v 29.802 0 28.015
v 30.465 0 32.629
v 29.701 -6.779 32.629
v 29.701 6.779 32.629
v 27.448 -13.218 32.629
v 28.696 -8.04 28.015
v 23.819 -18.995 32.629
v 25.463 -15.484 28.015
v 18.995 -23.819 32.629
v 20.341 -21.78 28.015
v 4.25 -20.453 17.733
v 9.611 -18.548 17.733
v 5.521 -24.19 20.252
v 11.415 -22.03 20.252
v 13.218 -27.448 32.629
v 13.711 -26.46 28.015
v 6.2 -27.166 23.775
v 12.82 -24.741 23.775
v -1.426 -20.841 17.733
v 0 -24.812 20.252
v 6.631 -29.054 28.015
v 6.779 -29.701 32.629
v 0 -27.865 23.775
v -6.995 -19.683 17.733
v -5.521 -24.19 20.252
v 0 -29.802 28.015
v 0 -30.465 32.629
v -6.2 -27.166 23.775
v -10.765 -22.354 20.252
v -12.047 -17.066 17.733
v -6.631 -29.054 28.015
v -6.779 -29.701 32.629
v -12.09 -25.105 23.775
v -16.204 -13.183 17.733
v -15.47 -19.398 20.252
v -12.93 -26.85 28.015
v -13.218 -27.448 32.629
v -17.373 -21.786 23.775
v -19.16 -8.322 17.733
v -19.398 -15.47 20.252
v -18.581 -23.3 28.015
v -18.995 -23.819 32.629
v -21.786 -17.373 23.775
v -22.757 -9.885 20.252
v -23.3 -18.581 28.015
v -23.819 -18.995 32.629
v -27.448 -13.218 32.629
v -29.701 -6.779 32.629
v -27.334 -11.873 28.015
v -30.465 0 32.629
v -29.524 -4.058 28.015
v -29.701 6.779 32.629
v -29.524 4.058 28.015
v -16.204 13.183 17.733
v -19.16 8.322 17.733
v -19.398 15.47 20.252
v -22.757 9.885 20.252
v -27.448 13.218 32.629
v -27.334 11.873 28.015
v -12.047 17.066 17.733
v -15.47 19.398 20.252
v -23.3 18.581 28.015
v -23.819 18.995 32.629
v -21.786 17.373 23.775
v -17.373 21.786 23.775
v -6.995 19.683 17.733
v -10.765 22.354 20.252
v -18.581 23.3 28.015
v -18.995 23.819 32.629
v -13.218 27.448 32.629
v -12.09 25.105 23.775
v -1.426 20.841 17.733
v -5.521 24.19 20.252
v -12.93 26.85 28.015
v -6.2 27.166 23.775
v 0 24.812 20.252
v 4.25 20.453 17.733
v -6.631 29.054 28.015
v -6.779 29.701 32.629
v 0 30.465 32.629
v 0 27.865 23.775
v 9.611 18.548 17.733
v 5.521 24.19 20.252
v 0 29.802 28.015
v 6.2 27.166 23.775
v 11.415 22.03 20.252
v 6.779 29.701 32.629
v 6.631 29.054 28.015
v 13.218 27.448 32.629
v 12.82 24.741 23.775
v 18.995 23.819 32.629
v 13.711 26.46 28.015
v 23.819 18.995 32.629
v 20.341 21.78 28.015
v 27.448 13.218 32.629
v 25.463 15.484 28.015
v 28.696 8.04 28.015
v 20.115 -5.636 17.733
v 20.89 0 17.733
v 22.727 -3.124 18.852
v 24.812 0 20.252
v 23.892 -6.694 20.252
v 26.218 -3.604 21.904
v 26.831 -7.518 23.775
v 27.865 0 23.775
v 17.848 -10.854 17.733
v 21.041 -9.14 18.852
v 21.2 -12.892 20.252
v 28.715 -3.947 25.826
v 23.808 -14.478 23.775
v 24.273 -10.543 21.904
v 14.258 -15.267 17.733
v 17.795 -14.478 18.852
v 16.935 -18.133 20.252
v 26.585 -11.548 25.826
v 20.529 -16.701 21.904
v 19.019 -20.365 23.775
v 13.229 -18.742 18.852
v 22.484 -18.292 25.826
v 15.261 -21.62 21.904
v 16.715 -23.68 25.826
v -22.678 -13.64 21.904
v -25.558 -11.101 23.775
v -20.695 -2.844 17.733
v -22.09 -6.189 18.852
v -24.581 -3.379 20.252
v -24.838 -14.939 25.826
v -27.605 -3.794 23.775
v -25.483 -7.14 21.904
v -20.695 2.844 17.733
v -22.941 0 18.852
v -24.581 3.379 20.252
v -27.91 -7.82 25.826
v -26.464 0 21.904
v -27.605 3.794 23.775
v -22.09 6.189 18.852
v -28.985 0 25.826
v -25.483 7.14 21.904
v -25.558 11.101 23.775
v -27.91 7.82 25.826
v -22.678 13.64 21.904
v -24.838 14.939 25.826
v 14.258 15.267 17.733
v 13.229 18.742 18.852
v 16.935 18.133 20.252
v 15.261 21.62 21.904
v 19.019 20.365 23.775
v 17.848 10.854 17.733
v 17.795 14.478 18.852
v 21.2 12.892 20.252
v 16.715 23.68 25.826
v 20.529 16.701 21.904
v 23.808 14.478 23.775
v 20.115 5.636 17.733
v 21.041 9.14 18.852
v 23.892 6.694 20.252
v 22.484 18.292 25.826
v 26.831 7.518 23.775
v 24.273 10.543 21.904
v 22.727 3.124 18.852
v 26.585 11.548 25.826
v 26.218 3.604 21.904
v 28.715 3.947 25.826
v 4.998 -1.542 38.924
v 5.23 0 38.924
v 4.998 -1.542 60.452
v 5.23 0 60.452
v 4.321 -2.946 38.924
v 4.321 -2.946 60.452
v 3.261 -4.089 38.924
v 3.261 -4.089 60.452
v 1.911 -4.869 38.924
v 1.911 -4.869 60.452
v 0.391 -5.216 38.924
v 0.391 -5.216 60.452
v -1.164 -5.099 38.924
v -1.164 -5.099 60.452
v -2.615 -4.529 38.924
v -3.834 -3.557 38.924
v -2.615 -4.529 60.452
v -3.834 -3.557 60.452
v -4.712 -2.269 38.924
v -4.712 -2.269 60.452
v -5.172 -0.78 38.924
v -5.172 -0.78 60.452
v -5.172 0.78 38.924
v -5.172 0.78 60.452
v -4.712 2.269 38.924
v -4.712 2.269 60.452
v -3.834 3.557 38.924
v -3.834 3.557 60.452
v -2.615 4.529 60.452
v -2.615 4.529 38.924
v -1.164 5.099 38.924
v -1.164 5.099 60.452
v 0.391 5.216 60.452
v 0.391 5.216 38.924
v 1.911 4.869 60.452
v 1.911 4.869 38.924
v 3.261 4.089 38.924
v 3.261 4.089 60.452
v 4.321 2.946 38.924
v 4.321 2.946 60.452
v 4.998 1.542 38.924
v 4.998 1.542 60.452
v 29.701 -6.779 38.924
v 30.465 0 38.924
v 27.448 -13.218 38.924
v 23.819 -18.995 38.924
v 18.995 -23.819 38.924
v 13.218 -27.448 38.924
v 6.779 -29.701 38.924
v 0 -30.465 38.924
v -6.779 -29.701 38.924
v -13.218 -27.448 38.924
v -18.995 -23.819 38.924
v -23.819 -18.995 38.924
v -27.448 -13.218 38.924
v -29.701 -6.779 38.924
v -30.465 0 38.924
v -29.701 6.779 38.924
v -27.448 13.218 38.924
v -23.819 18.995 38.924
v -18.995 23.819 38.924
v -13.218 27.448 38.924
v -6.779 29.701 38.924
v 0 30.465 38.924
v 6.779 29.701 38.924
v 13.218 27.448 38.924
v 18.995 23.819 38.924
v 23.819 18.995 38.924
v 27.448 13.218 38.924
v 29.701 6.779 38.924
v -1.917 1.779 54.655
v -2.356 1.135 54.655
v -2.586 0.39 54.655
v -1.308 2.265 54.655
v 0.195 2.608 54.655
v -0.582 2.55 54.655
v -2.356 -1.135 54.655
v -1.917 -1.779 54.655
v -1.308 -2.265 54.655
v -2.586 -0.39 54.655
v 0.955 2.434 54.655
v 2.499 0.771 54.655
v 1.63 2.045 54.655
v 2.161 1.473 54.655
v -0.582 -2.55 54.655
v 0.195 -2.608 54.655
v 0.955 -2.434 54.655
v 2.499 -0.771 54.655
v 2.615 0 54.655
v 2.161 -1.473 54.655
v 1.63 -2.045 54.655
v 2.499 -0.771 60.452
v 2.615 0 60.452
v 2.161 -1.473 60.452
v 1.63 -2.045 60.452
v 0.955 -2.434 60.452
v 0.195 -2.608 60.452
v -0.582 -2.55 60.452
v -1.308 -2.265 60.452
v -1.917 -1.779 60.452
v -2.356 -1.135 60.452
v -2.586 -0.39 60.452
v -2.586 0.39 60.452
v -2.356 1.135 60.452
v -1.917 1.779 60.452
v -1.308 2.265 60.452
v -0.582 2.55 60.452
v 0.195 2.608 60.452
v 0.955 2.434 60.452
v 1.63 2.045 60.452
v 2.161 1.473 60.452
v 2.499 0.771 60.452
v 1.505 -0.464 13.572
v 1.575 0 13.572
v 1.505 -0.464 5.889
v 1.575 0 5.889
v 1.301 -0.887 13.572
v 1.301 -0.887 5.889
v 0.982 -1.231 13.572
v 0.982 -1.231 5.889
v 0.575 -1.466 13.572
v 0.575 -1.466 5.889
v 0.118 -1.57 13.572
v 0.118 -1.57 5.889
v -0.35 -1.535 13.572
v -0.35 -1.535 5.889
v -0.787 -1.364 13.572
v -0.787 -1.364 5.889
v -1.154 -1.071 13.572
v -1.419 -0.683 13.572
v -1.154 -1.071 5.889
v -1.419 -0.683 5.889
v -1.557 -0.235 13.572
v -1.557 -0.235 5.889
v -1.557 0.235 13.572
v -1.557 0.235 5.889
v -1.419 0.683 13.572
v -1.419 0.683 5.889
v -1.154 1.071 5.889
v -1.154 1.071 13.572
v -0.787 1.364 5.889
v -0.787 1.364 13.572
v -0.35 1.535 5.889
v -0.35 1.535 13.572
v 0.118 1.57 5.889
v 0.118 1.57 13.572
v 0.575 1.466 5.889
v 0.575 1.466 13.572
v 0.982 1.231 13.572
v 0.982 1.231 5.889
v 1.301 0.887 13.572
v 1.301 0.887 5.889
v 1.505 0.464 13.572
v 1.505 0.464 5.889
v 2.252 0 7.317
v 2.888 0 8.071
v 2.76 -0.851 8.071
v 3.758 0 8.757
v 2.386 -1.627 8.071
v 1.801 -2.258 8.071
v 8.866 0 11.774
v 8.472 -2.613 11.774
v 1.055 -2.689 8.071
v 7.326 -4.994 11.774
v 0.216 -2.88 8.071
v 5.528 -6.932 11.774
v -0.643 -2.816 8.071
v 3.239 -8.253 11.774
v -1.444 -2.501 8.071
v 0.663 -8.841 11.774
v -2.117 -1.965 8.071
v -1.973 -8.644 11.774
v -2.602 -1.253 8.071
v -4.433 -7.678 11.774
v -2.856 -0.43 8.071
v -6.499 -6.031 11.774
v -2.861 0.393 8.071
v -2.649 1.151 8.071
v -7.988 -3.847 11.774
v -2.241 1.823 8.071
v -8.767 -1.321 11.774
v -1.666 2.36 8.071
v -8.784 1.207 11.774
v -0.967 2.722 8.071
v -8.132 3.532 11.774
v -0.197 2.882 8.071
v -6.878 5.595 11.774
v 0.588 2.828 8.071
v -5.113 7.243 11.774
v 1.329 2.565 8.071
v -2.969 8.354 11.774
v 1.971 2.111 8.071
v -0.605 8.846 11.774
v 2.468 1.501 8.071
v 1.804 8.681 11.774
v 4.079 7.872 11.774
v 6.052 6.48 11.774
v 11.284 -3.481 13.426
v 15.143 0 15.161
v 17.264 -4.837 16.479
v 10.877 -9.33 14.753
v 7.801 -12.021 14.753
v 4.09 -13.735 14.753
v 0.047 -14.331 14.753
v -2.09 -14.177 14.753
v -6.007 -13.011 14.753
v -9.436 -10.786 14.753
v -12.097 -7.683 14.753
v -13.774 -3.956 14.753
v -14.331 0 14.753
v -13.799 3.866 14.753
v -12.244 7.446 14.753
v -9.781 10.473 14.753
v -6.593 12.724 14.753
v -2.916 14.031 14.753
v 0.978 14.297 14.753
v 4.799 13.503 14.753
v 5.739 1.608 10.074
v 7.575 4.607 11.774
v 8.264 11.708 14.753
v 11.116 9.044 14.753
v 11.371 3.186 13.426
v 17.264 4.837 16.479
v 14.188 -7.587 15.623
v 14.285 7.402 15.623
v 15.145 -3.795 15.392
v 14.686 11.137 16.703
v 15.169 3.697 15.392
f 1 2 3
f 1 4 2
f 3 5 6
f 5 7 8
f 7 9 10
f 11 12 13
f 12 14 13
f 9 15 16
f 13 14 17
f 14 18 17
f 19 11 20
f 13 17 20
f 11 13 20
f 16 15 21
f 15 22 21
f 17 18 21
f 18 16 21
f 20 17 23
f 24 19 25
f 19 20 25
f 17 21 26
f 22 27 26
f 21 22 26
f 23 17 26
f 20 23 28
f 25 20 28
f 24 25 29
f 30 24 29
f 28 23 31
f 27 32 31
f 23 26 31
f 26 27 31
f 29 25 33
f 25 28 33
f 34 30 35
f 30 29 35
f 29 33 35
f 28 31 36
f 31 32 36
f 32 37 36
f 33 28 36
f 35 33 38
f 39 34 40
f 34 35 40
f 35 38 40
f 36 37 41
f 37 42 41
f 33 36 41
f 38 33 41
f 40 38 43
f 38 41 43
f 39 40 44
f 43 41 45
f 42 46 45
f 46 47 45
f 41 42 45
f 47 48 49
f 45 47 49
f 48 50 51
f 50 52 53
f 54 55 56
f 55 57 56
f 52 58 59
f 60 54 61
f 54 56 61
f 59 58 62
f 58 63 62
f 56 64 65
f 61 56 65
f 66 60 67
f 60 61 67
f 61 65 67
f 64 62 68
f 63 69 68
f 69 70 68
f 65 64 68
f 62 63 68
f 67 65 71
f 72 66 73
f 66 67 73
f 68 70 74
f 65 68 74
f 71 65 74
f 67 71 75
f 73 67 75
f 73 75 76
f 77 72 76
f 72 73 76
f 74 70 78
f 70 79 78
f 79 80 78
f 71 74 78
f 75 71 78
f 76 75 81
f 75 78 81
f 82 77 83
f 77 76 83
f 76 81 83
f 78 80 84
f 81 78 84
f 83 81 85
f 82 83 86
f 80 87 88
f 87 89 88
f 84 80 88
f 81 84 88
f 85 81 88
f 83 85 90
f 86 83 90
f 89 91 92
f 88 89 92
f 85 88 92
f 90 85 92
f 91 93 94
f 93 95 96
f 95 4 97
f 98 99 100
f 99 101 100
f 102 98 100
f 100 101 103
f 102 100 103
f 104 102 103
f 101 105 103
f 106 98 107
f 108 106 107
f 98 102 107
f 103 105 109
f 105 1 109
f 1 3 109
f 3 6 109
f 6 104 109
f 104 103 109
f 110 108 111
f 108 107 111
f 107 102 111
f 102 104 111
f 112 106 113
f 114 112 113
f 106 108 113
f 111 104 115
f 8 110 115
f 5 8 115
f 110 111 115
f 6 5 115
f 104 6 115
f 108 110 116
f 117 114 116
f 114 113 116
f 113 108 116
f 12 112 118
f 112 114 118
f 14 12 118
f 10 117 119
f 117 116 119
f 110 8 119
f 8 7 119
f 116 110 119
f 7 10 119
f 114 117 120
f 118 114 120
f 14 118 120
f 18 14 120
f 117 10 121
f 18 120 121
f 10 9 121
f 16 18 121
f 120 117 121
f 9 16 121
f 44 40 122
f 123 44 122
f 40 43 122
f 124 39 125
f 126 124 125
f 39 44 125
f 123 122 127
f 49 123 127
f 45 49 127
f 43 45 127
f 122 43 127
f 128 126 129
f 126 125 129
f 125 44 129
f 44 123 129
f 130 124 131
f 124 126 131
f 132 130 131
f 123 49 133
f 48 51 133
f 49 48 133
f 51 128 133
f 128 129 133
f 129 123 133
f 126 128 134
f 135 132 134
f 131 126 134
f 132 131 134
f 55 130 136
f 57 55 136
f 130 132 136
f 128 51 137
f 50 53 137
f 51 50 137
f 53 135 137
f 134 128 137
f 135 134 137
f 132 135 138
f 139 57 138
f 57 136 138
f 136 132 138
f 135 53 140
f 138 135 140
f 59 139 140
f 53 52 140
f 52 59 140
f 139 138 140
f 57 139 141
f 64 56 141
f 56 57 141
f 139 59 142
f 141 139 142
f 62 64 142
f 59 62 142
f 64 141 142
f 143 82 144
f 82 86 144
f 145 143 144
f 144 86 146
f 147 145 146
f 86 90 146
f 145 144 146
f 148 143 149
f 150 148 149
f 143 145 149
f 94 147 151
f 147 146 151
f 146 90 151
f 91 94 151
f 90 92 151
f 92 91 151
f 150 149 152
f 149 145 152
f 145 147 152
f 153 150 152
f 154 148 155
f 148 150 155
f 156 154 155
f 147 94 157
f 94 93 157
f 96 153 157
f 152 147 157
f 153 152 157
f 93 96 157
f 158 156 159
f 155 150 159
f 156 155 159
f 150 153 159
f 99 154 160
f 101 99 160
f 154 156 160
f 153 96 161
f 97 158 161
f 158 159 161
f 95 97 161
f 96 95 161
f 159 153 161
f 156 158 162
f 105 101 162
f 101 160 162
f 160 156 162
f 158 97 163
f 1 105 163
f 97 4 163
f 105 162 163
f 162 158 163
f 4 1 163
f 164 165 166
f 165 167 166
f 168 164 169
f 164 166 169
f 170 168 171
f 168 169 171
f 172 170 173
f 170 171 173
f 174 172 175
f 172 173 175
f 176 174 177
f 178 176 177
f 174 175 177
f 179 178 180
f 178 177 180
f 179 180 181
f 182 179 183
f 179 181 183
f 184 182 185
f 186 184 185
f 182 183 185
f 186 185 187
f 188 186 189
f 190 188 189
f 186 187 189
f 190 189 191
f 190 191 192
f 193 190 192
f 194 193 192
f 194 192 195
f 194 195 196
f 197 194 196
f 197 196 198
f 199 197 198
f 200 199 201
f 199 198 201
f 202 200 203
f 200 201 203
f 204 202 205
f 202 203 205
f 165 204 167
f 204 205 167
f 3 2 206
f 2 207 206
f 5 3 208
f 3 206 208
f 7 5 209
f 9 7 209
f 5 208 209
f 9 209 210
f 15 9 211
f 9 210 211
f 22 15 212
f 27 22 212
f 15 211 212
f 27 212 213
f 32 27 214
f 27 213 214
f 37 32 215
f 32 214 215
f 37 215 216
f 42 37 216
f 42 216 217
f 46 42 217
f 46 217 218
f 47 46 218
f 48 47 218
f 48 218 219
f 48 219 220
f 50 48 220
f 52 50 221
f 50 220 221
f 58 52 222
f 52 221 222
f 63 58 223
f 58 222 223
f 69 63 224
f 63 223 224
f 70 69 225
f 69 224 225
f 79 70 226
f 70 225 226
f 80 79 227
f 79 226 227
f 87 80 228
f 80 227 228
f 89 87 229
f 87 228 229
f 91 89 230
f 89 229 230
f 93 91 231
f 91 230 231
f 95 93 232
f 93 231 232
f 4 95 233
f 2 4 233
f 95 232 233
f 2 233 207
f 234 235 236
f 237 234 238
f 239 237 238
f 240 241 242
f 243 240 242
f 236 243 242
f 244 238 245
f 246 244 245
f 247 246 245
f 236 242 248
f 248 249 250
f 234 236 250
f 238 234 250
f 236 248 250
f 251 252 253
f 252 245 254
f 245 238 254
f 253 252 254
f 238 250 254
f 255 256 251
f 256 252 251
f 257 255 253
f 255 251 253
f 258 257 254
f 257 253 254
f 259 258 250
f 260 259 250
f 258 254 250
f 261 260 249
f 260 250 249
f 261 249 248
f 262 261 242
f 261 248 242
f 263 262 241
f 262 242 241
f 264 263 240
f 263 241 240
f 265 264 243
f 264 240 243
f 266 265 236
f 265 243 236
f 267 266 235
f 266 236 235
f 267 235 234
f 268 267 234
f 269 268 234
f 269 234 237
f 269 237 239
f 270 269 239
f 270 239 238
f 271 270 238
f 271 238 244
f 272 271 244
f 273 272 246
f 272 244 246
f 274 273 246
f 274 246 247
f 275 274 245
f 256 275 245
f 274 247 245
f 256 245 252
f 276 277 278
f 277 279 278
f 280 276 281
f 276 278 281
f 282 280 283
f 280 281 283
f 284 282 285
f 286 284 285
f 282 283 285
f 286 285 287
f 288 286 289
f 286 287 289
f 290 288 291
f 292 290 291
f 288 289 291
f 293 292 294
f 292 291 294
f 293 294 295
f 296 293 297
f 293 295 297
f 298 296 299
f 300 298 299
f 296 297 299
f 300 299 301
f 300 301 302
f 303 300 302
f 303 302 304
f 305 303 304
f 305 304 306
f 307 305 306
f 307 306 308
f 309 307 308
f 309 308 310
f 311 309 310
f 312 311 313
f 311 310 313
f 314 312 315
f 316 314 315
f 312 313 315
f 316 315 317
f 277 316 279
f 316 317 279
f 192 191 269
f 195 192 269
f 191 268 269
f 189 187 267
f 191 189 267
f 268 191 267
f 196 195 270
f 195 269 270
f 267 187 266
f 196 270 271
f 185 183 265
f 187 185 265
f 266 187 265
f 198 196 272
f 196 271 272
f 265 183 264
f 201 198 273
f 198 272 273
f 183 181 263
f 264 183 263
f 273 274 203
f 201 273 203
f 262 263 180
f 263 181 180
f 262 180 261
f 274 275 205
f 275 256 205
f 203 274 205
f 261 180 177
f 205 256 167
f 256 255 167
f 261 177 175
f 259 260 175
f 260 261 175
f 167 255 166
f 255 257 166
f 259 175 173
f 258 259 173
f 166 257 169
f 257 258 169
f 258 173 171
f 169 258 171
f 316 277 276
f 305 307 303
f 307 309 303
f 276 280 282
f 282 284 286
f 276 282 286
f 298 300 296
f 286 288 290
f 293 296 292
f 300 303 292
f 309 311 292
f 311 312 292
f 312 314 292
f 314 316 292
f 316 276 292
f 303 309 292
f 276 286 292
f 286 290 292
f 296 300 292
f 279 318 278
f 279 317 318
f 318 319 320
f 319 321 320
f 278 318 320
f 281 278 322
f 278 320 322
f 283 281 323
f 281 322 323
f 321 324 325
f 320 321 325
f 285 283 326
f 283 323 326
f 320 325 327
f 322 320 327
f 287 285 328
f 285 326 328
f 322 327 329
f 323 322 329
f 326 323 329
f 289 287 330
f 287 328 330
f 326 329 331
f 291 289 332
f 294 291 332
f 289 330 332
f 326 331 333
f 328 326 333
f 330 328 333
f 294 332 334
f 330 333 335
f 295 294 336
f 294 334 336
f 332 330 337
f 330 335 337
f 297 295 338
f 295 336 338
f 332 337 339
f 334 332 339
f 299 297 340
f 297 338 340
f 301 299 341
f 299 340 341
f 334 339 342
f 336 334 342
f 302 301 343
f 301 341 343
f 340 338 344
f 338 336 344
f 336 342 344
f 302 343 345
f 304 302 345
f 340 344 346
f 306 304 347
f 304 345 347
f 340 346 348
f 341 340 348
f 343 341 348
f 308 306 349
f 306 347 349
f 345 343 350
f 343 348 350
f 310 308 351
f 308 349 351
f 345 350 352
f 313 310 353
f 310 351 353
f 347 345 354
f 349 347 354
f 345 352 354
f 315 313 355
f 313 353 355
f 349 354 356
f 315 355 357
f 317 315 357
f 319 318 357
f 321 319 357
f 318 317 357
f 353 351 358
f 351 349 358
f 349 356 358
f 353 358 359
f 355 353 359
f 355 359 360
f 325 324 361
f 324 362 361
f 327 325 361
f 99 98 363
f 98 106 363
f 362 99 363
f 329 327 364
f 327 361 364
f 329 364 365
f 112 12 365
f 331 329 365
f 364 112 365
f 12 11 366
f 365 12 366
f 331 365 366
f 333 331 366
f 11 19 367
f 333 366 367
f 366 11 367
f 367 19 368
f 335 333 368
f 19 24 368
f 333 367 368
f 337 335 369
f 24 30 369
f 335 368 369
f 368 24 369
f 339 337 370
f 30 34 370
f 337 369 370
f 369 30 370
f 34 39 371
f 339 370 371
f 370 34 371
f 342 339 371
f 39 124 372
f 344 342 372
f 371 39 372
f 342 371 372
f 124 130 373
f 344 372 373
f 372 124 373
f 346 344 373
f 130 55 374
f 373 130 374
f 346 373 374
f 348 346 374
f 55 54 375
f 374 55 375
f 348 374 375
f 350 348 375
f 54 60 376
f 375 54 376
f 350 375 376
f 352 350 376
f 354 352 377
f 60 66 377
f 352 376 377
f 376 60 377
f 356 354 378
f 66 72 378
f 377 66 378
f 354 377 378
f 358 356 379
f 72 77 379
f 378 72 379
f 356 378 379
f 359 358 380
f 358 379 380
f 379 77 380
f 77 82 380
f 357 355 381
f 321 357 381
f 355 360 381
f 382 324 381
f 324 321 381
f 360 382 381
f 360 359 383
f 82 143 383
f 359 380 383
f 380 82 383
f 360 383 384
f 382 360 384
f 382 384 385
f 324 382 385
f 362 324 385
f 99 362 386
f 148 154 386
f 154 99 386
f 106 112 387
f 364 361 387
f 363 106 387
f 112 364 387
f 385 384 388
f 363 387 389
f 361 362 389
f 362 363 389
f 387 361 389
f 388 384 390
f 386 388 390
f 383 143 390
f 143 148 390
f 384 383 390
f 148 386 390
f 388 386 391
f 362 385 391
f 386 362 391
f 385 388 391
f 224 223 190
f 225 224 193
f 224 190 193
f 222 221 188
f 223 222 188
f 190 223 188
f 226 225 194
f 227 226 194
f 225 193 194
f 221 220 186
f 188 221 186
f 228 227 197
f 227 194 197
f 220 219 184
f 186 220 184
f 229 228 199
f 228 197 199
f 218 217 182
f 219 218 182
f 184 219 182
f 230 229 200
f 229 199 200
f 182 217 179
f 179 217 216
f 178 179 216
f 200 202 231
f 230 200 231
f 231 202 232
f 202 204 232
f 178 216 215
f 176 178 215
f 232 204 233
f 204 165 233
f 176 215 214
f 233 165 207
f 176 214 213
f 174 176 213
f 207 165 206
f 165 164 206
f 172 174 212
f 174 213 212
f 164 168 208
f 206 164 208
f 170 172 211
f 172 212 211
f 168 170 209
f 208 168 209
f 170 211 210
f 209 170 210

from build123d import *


with BuildPart() as f1:
    # F0 (on Front) → F1 (revolve)
    with BuildSketch(Plane.XZ):
        with BuildLine():
            ThreePointArc((20.8895848504, 17.7330967147), (27.8647612982, 23.7748747477), (30.465135211, 32.6289260119))
            Line((30.465135211, 32.6289260119), (30.465135211, 38.9237075527))
            Line((30.465135211, 38.9237075527), (5.23019908, 38.9237075527))
            Line((5.23019908, 38.9237075527), (5.23019908, 60.452))
            Line((5.23019908, 60.452), (2.61509954, 60.452))
            Line((2.61509954, 60.452), (2.61509954, 54.6547174454))
            Line((2.61509954, 54.6547174454), (0, 54.6547174454))
            Line((0, 54.6547174454), (0, 13.5723771527))
            Line((0, 13.5723771527), (1.5748, 13.5723771527))
            Line((1.5748, 13.5723771527), (1.5748, 5.8891402269))
            add(Edge.make_bspline(
                [(1.5748, 5.8891402269), (2.2689800992, 7.9924499936), (5.5516818726, 9.7161236554), (14.2092827263, 15.0823711378), (20.8895848504, 17.7330967147)],
                knots=[0, 0, 0, 0, 0.3541424232, 1, 1, 1, 1], degree=3))
        make_face()
    revolve(axis=Axis((0, 0, 34.1135472991), (0, 0, -1)))


solid = f1.part
